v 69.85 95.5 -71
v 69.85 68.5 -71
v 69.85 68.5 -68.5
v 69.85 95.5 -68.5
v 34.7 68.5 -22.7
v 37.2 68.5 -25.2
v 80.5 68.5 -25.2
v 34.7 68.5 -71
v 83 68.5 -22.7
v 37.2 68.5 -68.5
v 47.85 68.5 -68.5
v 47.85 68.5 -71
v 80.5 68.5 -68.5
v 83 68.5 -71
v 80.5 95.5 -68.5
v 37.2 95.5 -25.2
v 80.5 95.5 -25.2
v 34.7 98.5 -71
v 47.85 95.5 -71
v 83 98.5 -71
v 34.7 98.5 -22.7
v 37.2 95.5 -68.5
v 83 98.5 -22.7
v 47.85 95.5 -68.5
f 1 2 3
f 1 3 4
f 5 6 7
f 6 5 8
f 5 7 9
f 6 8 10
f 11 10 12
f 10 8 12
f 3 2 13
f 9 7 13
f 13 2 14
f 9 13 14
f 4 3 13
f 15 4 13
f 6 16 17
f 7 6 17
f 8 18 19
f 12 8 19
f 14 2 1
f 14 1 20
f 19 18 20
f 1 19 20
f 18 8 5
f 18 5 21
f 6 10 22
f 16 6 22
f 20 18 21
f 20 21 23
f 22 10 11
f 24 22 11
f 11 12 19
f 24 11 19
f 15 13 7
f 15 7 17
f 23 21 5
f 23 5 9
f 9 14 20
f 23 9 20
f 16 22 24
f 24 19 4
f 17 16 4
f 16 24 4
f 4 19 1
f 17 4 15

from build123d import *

# Parameters (mm, degrees)
BOX019_W     = 22
BOX019_H     = 27
BOX019_DEPTH = 10
BOX016_W     = 43.3
BOX016_H     = 27
BOX016_DEPTH = 43.3
BOX015_W     = 48.3
BOX015_H     = 30
BOX015_DEPTH = 48.3


with BuildPart() as cube:
    # Box019 → Box019 (new body)
    with BuildSketch(Plane(origin=(47.85, 68.5, -75), x_dir=(1, 0, 0), z_dir=(0, 0, 1))):
        with Locations((11, 13.5)):
            Rectangle(BOX019_W, BOX019_H)
    extrude(amount=BOX019_DEPTH)


with BuildPart() as statictraynegative:
    # Box016 → Box016 (new body)
    with BuildSketch(Plane(origin=(93.5, 0, 2.5), x_dir=(1, 0, 0), z_dir=(0, 0, 1))):
        with Locations((21.65, 13.5)):
            Rectangle(BOX016_W, BOX016_H)
    extrude(amount=BOX016_DEPTH)


with BuildPart() as lineartray:
    # Box015 → Box015 (new body)
    with BuildSketch(Plane(origin=(91, 0, 0), x_dir=(1, 0, 0), z_dir=(0, 0, 1))):
        with Locations((24.15, 15)):
            Rectangle(BOX015_W, BOX015_H)
    extrude(amount=BOX015_DEPTH)

    # Cut017: cut StaticTrayNegative
    add(statictraynegative.part, mode=Mode.SUBTRACT)


with BuildPart() as lineartray_1:
    # Cut017 placement: moved
    add(lineartray.part.moved(Location((-56.3, 68.5, -71))))

    # Cut018: cut Cube
    add(cube.part, mode=Mode.SUBTRACT)


solid = lineartray_1.part
